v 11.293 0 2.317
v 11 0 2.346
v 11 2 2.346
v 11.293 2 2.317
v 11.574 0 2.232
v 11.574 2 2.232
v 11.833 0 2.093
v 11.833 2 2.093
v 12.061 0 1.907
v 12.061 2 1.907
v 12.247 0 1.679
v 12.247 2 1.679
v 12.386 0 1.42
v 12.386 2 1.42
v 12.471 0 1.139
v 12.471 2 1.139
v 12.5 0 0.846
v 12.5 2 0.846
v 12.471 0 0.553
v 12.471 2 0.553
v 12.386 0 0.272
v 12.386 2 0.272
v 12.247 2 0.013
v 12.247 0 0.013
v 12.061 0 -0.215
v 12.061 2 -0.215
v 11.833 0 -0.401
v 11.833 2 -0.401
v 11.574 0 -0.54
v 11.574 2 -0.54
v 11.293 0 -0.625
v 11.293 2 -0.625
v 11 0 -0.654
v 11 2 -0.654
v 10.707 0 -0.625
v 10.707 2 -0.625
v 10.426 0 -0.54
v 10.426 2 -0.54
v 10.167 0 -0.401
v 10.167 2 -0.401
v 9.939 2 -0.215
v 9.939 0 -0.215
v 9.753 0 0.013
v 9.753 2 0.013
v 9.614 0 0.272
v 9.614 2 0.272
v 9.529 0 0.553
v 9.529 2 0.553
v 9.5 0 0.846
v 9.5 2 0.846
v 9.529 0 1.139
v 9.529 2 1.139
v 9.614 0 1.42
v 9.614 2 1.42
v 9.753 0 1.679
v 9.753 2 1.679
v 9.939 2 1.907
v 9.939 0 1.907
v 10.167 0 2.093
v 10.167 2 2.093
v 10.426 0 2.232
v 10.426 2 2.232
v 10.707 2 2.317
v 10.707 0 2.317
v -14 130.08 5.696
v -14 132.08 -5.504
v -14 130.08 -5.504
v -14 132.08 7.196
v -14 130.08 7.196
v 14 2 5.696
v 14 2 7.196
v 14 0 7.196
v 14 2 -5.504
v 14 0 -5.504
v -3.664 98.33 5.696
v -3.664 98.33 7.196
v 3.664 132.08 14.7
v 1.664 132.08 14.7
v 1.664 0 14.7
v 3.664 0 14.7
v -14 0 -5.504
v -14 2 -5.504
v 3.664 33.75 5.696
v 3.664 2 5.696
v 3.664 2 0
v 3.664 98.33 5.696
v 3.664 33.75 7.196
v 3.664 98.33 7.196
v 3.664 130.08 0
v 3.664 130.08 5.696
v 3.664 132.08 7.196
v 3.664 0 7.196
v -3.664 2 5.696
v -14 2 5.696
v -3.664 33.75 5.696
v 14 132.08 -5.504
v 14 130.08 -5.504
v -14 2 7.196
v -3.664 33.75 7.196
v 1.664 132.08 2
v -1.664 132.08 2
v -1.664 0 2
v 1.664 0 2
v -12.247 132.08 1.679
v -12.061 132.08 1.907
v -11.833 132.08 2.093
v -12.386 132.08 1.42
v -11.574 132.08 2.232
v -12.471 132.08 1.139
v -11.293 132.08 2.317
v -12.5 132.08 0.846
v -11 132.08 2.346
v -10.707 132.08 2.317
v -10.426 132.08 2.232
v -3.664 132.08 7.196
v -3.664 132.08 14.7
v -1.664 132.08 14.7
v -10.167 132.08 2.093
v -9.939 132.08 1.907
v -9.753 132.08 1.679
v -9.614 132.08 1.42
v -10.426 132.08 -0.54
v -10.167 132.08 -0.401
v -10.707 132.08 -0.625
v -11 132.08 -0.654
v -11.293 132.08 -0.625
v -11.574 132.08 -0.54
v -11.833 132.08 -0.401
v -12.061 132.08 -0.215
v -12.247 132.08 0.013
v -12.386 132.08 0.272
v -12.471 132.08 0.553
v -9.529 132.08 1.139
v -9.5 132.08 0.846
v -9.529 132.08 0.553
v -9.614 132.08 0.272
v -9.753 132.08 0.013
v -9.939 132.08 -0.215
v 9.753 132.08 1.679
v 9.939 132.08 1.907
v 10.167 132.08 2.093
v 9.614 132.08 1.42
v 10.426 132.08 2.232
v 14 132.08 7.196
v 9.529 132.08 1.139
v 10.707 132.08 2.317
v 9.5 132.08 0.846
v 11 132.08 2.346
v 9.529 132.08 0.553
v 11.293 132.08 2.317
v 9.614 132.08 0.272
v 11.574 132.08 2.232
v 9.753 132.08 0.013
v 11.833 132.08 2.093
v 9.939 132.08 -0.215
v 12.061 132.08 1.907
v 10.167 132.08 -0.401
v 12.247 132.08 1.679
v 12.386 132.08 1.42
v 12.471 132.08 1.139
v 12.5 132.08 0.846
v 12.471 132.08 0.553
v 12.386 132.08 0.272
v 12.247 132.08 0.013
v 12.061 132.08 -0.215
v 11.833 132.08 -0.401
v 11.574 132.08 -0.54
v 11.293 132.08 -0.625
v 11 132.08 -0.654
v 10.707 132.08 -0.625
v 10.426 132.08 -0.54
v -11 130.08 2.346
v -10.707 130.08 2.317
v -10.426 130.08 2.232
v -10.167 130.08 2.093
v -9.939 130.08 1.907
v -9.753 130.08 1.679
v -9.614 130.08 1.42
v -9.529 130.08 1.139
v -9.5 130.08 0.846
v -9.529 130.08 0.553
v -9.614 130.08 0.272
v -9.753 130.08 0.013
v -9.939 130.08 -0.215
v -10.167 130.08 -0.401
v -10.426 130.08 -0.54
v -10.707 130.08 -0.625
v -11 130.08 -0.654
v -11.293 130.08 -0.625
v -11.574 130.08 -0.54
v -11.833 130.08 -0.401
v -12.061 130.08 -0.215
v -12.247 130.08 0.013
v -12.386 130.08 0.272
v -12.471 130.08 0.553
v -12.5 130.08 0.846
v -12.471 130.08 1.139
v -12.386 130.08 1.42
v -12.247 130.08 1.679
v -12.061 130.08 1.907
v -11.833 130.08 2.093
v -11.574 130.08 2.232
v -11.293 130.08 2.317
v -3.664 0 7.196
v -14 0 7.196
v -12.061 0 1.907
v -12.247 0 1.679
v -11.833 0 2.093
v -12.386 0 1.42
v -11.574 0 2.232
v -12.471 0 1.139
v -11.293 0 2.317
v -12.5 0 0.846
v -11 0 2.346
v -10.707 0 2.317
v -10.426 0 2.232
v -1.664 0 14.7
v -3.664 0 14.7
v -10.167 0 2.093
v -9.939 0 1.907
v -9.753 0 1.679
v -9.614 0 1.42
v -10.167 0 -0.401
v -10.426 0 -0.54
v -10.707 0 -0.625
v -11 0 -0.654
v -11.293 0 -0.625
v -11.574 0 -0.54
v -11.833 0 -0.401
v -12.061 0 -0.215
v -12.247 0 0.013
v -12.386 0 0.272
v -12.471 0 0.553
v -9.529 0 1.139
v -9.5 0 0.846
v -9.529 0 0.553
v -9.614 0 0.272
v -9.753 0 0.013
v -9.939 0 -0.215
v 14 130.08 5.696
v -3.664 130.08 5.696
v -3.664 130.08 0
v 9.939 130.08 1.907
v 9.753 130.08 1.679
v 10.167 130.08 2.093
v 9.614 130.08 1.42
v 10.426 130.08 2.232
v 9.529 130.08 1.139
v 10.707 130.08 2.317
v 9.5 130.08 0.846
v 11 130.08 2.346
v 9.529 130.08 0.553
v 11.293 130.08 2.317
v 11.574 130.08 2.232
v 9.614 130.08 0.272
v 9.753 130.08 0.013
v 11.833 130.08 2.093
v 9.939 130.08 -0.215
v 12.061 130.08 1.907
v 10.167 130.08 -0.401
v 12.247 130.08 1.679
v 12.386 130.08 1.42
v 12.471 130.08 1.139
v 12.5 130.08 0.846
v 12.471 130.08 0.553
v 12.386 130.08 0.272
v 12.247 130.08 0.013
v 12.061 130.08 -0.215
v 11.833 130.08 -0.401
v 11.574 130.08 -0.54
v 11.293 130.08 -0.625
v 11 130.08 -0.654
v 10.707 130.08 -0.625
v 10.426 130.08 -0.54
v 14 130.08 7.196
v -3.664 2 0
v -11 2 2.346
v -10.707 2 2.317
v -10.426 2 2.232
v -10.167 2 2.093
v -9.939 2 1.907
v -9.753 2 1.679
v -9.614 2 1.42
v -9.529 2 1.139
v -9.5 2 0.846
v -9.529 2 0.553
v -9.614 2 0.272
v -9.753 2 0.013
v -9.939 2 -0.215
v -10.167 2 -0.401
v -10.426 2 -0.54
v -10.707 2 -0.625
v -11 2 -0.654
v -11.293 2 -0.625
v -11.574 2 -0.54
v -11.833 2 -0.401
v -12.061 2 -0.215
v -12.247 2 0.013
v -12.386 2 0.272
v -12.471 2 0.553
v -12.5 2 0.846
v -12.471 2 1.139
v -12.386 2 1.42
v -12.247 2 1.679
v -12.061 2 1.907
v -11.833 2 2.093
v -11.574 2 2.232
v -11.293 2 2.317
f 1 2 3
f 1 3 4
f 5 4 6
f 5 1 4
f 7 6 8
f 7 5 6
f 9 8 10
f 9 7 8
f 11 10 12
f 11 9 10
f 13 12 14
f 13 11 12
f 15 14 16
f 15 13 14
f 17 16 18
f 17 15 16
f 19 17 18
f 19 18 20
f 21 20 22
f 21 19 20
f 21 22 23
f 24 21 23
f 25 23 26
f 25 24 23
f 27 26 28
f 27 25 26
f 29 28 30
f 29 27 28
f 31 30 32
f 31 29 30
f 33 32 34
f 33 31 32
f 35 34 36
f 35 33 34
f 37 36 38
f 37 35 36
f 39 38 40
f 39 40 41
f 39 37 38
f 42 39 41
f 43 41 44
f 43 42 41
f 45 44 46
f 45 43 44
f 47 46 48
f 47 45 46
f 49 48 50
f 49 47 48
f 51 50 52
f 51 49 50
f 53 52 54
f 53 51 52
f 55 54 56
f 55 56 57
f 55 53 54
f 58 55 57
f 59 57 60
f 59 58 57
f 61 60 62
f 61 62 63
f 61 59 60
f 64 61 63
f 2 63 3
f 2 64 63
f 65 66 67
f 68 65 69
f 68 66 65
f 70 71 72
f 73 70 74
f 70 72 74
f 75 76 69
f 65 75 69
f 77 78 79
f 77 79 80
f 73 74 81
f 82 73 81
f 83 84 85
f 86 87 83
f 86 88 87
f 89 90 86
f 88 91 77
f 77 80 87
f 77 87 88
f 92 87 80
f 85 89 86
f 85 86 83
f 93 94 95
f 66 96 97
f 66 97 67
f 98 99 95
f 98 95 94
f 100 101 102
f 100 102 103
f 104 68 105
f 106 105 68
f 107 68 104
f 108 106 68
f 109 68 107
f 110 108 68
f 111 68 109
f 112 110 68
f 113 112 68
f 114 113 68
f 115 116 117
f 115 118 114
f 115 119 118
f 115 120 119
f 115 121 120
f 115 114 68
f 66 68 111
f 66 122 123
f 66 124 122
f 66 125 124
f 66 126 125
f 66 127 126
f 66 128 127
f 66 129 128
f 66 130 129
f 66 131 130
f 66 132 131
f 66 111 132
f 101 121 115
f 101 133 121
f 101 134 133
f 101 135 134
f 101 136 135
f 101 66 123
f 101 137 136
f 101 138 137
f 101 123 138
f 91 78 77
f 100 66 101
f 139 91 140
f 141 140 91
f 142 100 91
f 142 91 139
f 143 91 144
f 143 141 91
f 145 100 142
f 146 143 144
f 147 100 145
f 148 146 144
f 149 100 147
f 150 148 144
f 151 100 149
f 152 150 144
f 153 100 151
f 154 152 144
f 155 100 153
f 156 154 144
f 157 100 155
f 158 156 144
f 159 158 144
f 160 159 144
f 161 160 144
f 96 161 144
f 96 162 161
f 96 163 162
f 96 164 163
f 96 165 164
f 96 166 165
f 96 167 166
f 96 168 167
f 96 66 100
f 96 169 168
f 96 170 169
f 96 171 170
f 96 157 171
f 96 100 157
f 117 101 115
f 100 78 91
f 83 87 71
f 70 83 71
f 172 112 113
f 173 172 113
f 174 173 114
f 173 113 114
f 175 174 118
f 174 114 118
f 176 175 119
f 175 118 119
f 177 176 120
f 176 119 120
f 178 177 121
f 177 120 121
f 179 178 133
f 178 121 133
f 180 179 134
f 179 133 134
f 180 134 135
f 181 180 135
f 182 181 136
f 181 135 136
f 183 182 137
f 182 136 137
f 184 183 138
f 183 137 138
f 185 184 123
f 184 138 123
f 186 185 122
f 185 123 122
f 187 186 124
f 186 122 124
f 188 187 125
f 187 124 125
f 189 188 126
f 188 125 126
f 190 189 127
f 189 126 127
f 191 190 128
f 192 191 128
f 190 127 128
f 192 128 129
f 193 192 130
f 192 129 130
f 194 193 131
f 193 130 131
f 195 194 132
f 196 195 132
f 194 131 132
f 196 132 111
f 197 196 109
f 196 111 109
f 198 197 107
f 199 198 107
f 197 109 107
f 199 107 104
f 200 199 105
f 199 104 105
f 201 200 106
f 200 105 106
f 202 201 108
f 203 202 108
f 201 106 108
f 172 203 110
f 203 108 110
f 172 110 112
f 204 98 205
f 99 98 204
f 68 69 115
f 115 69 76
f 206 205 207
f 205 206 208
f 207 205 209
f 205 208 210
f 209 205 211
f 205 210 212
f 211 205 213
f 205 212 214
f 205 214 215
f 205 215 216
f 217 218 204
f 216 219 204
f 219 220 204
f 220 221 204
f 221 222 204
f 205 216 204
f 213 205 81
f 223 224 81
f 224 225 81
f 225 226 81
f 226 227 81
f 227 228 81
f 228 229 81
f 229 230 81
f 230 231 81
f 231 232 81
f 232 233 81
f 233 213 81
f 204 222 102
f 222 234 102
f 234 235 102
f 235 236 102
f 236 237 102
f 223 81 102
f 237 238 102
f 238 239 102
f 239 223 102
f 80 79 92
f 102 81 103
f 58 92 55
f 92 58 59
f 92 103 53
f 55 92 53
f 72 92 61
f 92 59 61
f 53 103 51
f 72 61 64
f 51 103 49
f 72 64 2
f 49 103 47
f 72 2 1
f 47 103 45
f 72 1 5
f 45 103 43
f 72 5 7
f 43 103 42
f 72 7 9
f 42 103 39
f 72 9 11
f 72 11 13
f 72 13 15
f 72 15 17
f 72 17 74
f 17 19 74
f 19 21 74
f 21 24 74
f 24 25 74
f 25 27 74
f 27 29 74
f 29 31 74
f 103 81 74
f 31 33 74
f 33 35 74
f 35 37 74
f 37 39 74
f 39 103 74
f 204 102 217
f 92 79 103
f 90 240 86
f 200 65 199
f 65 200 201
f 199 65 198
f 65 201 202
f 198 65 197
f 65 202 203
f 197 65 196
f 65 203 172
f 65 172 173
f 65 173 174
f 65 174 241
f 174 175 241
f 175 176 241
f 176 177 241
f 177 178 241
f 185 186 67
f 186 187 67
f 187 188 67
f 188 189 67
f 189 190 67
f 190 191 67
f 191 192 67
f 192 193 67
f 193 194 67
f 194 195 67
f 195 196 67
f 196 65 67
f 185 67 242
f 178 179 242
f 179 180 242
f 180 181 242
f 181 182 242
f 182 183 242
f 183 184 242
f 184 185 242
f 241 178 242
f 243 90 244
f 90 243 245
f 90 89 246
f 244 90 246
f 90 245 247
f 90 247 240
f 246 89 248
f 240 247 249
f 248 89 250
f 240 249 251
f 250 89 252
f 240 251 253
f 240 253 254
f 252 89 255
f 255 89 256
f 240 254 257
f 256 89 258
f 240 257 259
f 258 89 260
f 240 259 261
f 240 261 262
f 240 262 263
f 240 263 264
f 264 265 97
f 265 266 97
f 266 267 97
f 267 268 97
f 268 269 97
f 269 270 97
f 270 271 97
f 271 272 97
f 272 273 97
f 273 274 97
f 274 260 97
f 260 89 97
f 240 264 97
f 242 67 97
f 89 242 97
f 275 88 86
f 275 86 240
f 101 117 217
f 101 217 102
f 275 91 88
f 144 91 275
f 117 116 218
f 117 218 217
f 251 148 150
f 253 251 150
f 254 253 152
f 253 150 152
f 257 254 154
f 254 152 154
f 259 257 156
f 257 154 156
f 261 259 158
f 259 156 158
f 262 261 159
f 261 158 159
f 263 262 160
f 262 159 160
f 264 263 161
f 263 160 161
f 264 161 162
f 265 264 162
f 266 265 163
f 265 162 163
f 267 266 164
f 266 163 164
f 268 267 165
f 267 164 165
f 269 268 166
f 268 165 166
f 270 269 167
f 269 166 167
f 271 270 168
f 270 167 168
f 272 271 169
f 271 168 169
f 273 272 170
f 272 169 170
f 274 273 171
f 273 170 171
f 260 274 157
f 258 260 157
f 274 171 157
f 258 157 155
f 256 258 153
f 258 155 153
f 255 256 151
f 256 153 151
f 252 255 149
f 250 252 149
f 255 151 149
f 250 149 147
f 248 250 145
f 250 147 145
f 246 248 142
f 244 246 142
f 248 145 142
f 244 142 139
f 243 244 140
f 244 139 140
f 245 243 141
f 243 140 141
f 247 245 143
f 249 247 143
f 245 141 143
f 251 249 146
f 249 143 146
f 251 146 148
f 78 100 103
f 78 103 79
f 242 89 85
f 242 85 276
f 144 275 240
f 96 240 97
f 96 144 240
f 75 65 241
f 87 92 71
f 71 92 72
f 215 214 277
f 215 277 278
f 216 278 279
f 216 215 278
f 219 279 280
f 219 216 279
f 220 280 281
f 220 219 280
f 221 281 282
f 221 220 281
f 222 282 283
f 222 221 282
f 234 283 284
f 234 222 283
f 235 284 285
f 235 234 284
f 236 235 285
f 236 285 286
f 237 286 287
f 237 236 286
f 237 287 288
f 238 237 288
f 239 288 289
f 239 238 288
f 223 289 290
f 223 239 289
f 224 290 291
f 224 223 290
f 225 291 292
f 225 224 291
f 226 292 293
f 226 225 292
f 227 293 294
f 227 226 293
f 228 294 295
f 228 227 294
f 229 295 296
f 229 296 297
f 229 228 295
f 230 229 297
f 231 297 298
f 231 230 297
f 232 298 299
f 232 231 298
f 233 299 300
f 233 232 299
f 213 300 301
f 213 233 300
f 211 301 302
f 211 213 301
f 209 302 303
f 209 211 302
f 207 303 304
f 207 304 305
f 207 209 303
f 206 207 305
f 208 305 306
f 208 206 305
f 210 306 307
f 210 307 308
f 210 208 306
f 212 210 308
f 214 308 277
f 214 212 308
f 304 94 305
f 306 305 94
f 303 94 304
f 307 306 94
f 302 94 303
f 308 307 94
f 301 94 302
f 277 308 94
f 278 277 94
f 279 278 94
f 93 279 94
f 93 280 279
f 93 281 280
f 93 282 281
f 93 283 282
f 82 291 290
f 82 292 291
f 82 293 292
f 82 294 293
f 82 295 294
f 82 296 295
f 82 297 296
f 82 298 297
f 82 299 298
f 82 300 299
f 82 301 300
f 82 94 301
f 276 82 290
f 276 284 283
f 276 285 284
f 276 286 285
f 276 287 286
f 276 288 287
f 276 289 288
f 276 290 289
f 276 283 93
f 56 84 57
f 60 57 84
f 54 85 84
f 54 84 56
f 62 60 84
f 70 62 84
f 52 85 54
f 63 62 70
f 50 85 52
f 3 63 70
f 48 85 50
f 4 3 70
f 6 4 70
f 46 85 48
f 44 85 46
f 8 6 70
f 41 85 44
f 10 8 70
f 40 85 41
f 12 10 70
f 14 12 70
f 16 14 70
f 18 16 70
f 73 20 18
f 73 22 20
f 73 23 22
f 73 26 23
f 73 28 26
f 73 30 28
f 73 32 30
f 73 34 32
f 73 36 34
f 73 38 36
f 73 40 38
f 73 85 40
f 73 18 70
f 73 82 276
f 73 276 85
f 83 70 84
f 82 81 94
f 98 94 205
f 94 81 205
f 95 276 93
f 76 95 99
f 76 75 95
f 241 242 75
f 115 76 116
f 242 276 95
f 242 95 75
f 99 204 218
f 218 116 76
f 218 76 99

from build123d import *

# Parameters (mm, degrees)
SKETCH1_R           = 1.5
BOSS_EXTRUDE1_DEPTH = 2
BOSS_EXTRUDE2_DEPTH = 38.1
BOSS_EXTRUDE3_DEPTH = 1.5
BOSS_EXTRUDE6_DEPTH = 27.94


with BuildPart() as part:
    # Sketch1 → Boss-Extrude1 (new body)
    with BuildSketch(Plane(origin=(0, 0, 0), x_dir=(1, 0, 0), z_dir=(0, 1, 0))):
        Polygon((-14, 5.5039982), (-14, -7.1960018), (-3.6637, -7.1960018), (-3.6637, -14.7), (-1.6637, -14.7), (-1.6637, -2), (1.6637, -2), (1.6637, -14.7), (3.6637, -14.7), (3.6637, -7.1960018), (14, -7.1960018), (14, 5.5039982), align=None)
        with Locations((-11, -0.8460018)):
            Circle(SKETCH1_R, mode=Mode.SUBTRACT)
        with Locations((11, -0.8460018)):
            Circle(SKETCH1_R, mode=Mode.SUBTRACT)
    extrude(amount=BOSS_EXTRUDE1_DEPTH)

    # Sketch1<3> → Boss-Extrude2 (add)
    with BuildSketch(Plane(origin=(0, 0, 0), x_dir=(1, 0, 0), z_dir=(0, 1, 0))):
        Polygon((3.6637, 0), (-3.6637, 0), (-3.6637, -14.7), (-1.6637, -14.7), (-1.6637, -2), (1.6637, -2), (1.6637, -14.7), (3.6637, -14.7), align=None)
    extrude(amount=BOSS_EXTRUDE2_DEPTH)

    # Sketch2 → Boss-Extrude3 (add)
    with BuildSketch(Plane(origin=(0, 0, 7.1960018), x_dir=(-1, 0, 0), z_dir=(0, 0, -1))):
        Polygon((3.6637, 2), (3.6637, 33.75), (14, 2), align=None)
        Polygon((-14, 2), (-3.6637, 2), (-3.6637, 33.75), align=None)
    extrude(amount=BOSS_EXTRUDE3_DEPTH)

    # Sketch6 → Boss-Extrude6 (add)
    with BuildSketch(Plane(origin=(0, 38.1, 0), x_dir=(1, 0, 0), z_dir=(0, 1, 0))):
        Polygon((1.6637, -14.7), (3.6637, -14.7), (3.6637, 0), (-3.6637, 0), (-3.6637, -14.7), (-1.6637, -14.7), (-1.6637, -2), (1.6637, -2), align=None)
    extrude(amount=BOSS_EXTRUDE6_DEPTH)

    # Mirror6: part across plane


with BuildPart() as part_1:
    add(part.part)
    add(part.part.mirror(Plane(origin=(0, 66.04, 0), x_dir=(0, 0, 1), z_dir=(0, -1, 0))))


solid = part_1.part
